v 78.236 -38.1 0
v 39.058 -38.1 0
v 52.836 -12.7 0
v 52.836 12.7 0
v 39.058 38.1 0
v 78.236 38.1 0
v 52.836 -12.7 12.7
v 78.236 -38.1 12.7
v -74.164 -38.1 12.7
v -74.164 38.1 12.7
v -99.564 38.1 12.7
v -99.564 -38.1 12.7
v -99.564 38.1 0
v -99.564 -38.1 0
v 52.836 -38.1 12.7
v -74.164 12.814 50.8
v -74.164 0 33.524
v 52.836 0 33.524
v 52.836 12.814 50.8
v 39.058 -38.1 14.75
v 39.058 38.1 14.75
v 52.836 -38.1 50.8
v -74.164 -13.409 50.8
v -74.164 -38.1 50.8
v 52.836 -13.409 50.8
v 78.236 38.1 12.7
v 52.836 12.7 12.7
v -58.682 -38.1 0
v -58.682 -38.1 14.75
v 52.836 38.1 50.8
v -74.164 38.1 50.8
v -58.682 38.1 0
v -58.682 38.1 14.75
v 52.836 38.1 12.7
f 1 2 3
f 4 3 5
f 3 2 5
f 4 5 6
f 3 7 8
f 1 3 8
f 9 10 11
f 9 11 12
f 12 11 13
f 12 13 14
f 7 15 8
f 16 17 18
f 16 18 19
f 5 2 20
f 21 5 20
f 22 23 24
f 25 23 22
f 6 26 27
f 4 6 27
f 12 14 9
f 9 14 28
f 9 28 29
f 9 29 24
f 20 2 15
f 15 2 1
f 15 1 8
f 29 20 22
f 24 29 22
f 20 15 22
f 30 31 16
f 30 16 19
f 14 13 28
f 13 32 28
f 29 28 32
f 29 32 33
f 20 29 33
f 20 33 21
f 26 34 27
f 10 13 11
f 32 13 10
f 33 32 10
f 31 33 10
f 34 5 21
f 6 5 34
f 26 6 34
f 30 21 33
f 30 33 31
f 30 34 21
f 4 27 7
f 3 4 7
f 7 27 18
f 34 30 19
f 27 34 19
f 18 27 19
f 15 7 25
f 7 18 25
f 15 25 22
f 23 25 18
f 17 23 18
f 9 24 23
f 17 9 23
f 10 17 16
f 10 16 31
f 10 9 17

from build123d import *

# Parameters (mm, degrees)
F0_W      = 152.4
F0_H      = 76.2
F1_DEPTH  = 50.8
F3_DEPTH  = 50.801
F4_DEPTH  = 38.1
F5_DEPTH  = 38.1
F7_DEPTH  = 127.001
F8_W      = 97.740334
F8_H      = 14.750447
F9_DEPTH  = 76.201
F10_W     = 76.2
F10_H     = 12.7
F11_DEPTH = 25.4


with BuildPart() as f1:
    # F0 (on Top) → F1 (new body)
    with BuildSketch(Plane.XY):
        with Locations((2.035878, 0)):
            Rectangle(F0_W, F0_H)
    extrude(amount=F1_DEPTH)

    # F2 (on face) → F3 (cut, through all)
    with BuildSketch(Plane.XY.offset(50.8)):
        Polygon((78.235878, -38.1), (78.235878, 38.1), (52.835878, 12.7), (52.835878, -12.7), align=None)
    extrude(amount=-F3_DEPTH, mode=Mode.SUBTRACT)

    # F2 (on face) → F4 (cut)
    with BuildSketch(Plane.XY.offset(50.8)):
        Polygon((52.835878, 12.7), (78.235878, 38.1), (52.835878, 38.1), align=None)
    extrude(amount=-F4_DEPTH, mode=Mode.SUBTRACT)

    # F2 (on face) → F5 (cut)
    with BuildSketch(Plane.XY.offset(50.8)):
        Polygon((52.835878, -38.1), (78.235878, -38.1), (52.835878, -12.7), align=None)
    extrude(amount=-F5_DEPTH, mode=Mode.SUBTRACT)

    # F6 (on face) → F7 (cut, through all)
    with BuildSketch(Plane.YZ.offset(52.835878)):
        Polygon((12.813521, 50.8), (-13.409496, 50.8), (0, 33.523746), align=None)
    extrude(amount=-F7_DEPTH, mode=Mode.SUBTRACT)

    # F8 (on face) → F9 (cut, through all)
    with BuildSketch(Plane.XZ.offset(38.1)):
        with Locations((-9.811988, 7.375223)):
            Rectangle(F8_W, F8_H)
    extrude(amount=-F9_DEPTH, mode=Mode.SUBTRACT)

    # F10 (on face) → F11 (join)
    with BuildSketch(Plane(origin=(-74.164122, 0, 0), x_dir=(0, -1, 0), z_dir=(-1, 0, 0))):
        with Locations((0, 6.35)):
            Rectangle(F10_W, F10_H)
    extrude(amount=F11_DEPTH)


solid = f1.part
